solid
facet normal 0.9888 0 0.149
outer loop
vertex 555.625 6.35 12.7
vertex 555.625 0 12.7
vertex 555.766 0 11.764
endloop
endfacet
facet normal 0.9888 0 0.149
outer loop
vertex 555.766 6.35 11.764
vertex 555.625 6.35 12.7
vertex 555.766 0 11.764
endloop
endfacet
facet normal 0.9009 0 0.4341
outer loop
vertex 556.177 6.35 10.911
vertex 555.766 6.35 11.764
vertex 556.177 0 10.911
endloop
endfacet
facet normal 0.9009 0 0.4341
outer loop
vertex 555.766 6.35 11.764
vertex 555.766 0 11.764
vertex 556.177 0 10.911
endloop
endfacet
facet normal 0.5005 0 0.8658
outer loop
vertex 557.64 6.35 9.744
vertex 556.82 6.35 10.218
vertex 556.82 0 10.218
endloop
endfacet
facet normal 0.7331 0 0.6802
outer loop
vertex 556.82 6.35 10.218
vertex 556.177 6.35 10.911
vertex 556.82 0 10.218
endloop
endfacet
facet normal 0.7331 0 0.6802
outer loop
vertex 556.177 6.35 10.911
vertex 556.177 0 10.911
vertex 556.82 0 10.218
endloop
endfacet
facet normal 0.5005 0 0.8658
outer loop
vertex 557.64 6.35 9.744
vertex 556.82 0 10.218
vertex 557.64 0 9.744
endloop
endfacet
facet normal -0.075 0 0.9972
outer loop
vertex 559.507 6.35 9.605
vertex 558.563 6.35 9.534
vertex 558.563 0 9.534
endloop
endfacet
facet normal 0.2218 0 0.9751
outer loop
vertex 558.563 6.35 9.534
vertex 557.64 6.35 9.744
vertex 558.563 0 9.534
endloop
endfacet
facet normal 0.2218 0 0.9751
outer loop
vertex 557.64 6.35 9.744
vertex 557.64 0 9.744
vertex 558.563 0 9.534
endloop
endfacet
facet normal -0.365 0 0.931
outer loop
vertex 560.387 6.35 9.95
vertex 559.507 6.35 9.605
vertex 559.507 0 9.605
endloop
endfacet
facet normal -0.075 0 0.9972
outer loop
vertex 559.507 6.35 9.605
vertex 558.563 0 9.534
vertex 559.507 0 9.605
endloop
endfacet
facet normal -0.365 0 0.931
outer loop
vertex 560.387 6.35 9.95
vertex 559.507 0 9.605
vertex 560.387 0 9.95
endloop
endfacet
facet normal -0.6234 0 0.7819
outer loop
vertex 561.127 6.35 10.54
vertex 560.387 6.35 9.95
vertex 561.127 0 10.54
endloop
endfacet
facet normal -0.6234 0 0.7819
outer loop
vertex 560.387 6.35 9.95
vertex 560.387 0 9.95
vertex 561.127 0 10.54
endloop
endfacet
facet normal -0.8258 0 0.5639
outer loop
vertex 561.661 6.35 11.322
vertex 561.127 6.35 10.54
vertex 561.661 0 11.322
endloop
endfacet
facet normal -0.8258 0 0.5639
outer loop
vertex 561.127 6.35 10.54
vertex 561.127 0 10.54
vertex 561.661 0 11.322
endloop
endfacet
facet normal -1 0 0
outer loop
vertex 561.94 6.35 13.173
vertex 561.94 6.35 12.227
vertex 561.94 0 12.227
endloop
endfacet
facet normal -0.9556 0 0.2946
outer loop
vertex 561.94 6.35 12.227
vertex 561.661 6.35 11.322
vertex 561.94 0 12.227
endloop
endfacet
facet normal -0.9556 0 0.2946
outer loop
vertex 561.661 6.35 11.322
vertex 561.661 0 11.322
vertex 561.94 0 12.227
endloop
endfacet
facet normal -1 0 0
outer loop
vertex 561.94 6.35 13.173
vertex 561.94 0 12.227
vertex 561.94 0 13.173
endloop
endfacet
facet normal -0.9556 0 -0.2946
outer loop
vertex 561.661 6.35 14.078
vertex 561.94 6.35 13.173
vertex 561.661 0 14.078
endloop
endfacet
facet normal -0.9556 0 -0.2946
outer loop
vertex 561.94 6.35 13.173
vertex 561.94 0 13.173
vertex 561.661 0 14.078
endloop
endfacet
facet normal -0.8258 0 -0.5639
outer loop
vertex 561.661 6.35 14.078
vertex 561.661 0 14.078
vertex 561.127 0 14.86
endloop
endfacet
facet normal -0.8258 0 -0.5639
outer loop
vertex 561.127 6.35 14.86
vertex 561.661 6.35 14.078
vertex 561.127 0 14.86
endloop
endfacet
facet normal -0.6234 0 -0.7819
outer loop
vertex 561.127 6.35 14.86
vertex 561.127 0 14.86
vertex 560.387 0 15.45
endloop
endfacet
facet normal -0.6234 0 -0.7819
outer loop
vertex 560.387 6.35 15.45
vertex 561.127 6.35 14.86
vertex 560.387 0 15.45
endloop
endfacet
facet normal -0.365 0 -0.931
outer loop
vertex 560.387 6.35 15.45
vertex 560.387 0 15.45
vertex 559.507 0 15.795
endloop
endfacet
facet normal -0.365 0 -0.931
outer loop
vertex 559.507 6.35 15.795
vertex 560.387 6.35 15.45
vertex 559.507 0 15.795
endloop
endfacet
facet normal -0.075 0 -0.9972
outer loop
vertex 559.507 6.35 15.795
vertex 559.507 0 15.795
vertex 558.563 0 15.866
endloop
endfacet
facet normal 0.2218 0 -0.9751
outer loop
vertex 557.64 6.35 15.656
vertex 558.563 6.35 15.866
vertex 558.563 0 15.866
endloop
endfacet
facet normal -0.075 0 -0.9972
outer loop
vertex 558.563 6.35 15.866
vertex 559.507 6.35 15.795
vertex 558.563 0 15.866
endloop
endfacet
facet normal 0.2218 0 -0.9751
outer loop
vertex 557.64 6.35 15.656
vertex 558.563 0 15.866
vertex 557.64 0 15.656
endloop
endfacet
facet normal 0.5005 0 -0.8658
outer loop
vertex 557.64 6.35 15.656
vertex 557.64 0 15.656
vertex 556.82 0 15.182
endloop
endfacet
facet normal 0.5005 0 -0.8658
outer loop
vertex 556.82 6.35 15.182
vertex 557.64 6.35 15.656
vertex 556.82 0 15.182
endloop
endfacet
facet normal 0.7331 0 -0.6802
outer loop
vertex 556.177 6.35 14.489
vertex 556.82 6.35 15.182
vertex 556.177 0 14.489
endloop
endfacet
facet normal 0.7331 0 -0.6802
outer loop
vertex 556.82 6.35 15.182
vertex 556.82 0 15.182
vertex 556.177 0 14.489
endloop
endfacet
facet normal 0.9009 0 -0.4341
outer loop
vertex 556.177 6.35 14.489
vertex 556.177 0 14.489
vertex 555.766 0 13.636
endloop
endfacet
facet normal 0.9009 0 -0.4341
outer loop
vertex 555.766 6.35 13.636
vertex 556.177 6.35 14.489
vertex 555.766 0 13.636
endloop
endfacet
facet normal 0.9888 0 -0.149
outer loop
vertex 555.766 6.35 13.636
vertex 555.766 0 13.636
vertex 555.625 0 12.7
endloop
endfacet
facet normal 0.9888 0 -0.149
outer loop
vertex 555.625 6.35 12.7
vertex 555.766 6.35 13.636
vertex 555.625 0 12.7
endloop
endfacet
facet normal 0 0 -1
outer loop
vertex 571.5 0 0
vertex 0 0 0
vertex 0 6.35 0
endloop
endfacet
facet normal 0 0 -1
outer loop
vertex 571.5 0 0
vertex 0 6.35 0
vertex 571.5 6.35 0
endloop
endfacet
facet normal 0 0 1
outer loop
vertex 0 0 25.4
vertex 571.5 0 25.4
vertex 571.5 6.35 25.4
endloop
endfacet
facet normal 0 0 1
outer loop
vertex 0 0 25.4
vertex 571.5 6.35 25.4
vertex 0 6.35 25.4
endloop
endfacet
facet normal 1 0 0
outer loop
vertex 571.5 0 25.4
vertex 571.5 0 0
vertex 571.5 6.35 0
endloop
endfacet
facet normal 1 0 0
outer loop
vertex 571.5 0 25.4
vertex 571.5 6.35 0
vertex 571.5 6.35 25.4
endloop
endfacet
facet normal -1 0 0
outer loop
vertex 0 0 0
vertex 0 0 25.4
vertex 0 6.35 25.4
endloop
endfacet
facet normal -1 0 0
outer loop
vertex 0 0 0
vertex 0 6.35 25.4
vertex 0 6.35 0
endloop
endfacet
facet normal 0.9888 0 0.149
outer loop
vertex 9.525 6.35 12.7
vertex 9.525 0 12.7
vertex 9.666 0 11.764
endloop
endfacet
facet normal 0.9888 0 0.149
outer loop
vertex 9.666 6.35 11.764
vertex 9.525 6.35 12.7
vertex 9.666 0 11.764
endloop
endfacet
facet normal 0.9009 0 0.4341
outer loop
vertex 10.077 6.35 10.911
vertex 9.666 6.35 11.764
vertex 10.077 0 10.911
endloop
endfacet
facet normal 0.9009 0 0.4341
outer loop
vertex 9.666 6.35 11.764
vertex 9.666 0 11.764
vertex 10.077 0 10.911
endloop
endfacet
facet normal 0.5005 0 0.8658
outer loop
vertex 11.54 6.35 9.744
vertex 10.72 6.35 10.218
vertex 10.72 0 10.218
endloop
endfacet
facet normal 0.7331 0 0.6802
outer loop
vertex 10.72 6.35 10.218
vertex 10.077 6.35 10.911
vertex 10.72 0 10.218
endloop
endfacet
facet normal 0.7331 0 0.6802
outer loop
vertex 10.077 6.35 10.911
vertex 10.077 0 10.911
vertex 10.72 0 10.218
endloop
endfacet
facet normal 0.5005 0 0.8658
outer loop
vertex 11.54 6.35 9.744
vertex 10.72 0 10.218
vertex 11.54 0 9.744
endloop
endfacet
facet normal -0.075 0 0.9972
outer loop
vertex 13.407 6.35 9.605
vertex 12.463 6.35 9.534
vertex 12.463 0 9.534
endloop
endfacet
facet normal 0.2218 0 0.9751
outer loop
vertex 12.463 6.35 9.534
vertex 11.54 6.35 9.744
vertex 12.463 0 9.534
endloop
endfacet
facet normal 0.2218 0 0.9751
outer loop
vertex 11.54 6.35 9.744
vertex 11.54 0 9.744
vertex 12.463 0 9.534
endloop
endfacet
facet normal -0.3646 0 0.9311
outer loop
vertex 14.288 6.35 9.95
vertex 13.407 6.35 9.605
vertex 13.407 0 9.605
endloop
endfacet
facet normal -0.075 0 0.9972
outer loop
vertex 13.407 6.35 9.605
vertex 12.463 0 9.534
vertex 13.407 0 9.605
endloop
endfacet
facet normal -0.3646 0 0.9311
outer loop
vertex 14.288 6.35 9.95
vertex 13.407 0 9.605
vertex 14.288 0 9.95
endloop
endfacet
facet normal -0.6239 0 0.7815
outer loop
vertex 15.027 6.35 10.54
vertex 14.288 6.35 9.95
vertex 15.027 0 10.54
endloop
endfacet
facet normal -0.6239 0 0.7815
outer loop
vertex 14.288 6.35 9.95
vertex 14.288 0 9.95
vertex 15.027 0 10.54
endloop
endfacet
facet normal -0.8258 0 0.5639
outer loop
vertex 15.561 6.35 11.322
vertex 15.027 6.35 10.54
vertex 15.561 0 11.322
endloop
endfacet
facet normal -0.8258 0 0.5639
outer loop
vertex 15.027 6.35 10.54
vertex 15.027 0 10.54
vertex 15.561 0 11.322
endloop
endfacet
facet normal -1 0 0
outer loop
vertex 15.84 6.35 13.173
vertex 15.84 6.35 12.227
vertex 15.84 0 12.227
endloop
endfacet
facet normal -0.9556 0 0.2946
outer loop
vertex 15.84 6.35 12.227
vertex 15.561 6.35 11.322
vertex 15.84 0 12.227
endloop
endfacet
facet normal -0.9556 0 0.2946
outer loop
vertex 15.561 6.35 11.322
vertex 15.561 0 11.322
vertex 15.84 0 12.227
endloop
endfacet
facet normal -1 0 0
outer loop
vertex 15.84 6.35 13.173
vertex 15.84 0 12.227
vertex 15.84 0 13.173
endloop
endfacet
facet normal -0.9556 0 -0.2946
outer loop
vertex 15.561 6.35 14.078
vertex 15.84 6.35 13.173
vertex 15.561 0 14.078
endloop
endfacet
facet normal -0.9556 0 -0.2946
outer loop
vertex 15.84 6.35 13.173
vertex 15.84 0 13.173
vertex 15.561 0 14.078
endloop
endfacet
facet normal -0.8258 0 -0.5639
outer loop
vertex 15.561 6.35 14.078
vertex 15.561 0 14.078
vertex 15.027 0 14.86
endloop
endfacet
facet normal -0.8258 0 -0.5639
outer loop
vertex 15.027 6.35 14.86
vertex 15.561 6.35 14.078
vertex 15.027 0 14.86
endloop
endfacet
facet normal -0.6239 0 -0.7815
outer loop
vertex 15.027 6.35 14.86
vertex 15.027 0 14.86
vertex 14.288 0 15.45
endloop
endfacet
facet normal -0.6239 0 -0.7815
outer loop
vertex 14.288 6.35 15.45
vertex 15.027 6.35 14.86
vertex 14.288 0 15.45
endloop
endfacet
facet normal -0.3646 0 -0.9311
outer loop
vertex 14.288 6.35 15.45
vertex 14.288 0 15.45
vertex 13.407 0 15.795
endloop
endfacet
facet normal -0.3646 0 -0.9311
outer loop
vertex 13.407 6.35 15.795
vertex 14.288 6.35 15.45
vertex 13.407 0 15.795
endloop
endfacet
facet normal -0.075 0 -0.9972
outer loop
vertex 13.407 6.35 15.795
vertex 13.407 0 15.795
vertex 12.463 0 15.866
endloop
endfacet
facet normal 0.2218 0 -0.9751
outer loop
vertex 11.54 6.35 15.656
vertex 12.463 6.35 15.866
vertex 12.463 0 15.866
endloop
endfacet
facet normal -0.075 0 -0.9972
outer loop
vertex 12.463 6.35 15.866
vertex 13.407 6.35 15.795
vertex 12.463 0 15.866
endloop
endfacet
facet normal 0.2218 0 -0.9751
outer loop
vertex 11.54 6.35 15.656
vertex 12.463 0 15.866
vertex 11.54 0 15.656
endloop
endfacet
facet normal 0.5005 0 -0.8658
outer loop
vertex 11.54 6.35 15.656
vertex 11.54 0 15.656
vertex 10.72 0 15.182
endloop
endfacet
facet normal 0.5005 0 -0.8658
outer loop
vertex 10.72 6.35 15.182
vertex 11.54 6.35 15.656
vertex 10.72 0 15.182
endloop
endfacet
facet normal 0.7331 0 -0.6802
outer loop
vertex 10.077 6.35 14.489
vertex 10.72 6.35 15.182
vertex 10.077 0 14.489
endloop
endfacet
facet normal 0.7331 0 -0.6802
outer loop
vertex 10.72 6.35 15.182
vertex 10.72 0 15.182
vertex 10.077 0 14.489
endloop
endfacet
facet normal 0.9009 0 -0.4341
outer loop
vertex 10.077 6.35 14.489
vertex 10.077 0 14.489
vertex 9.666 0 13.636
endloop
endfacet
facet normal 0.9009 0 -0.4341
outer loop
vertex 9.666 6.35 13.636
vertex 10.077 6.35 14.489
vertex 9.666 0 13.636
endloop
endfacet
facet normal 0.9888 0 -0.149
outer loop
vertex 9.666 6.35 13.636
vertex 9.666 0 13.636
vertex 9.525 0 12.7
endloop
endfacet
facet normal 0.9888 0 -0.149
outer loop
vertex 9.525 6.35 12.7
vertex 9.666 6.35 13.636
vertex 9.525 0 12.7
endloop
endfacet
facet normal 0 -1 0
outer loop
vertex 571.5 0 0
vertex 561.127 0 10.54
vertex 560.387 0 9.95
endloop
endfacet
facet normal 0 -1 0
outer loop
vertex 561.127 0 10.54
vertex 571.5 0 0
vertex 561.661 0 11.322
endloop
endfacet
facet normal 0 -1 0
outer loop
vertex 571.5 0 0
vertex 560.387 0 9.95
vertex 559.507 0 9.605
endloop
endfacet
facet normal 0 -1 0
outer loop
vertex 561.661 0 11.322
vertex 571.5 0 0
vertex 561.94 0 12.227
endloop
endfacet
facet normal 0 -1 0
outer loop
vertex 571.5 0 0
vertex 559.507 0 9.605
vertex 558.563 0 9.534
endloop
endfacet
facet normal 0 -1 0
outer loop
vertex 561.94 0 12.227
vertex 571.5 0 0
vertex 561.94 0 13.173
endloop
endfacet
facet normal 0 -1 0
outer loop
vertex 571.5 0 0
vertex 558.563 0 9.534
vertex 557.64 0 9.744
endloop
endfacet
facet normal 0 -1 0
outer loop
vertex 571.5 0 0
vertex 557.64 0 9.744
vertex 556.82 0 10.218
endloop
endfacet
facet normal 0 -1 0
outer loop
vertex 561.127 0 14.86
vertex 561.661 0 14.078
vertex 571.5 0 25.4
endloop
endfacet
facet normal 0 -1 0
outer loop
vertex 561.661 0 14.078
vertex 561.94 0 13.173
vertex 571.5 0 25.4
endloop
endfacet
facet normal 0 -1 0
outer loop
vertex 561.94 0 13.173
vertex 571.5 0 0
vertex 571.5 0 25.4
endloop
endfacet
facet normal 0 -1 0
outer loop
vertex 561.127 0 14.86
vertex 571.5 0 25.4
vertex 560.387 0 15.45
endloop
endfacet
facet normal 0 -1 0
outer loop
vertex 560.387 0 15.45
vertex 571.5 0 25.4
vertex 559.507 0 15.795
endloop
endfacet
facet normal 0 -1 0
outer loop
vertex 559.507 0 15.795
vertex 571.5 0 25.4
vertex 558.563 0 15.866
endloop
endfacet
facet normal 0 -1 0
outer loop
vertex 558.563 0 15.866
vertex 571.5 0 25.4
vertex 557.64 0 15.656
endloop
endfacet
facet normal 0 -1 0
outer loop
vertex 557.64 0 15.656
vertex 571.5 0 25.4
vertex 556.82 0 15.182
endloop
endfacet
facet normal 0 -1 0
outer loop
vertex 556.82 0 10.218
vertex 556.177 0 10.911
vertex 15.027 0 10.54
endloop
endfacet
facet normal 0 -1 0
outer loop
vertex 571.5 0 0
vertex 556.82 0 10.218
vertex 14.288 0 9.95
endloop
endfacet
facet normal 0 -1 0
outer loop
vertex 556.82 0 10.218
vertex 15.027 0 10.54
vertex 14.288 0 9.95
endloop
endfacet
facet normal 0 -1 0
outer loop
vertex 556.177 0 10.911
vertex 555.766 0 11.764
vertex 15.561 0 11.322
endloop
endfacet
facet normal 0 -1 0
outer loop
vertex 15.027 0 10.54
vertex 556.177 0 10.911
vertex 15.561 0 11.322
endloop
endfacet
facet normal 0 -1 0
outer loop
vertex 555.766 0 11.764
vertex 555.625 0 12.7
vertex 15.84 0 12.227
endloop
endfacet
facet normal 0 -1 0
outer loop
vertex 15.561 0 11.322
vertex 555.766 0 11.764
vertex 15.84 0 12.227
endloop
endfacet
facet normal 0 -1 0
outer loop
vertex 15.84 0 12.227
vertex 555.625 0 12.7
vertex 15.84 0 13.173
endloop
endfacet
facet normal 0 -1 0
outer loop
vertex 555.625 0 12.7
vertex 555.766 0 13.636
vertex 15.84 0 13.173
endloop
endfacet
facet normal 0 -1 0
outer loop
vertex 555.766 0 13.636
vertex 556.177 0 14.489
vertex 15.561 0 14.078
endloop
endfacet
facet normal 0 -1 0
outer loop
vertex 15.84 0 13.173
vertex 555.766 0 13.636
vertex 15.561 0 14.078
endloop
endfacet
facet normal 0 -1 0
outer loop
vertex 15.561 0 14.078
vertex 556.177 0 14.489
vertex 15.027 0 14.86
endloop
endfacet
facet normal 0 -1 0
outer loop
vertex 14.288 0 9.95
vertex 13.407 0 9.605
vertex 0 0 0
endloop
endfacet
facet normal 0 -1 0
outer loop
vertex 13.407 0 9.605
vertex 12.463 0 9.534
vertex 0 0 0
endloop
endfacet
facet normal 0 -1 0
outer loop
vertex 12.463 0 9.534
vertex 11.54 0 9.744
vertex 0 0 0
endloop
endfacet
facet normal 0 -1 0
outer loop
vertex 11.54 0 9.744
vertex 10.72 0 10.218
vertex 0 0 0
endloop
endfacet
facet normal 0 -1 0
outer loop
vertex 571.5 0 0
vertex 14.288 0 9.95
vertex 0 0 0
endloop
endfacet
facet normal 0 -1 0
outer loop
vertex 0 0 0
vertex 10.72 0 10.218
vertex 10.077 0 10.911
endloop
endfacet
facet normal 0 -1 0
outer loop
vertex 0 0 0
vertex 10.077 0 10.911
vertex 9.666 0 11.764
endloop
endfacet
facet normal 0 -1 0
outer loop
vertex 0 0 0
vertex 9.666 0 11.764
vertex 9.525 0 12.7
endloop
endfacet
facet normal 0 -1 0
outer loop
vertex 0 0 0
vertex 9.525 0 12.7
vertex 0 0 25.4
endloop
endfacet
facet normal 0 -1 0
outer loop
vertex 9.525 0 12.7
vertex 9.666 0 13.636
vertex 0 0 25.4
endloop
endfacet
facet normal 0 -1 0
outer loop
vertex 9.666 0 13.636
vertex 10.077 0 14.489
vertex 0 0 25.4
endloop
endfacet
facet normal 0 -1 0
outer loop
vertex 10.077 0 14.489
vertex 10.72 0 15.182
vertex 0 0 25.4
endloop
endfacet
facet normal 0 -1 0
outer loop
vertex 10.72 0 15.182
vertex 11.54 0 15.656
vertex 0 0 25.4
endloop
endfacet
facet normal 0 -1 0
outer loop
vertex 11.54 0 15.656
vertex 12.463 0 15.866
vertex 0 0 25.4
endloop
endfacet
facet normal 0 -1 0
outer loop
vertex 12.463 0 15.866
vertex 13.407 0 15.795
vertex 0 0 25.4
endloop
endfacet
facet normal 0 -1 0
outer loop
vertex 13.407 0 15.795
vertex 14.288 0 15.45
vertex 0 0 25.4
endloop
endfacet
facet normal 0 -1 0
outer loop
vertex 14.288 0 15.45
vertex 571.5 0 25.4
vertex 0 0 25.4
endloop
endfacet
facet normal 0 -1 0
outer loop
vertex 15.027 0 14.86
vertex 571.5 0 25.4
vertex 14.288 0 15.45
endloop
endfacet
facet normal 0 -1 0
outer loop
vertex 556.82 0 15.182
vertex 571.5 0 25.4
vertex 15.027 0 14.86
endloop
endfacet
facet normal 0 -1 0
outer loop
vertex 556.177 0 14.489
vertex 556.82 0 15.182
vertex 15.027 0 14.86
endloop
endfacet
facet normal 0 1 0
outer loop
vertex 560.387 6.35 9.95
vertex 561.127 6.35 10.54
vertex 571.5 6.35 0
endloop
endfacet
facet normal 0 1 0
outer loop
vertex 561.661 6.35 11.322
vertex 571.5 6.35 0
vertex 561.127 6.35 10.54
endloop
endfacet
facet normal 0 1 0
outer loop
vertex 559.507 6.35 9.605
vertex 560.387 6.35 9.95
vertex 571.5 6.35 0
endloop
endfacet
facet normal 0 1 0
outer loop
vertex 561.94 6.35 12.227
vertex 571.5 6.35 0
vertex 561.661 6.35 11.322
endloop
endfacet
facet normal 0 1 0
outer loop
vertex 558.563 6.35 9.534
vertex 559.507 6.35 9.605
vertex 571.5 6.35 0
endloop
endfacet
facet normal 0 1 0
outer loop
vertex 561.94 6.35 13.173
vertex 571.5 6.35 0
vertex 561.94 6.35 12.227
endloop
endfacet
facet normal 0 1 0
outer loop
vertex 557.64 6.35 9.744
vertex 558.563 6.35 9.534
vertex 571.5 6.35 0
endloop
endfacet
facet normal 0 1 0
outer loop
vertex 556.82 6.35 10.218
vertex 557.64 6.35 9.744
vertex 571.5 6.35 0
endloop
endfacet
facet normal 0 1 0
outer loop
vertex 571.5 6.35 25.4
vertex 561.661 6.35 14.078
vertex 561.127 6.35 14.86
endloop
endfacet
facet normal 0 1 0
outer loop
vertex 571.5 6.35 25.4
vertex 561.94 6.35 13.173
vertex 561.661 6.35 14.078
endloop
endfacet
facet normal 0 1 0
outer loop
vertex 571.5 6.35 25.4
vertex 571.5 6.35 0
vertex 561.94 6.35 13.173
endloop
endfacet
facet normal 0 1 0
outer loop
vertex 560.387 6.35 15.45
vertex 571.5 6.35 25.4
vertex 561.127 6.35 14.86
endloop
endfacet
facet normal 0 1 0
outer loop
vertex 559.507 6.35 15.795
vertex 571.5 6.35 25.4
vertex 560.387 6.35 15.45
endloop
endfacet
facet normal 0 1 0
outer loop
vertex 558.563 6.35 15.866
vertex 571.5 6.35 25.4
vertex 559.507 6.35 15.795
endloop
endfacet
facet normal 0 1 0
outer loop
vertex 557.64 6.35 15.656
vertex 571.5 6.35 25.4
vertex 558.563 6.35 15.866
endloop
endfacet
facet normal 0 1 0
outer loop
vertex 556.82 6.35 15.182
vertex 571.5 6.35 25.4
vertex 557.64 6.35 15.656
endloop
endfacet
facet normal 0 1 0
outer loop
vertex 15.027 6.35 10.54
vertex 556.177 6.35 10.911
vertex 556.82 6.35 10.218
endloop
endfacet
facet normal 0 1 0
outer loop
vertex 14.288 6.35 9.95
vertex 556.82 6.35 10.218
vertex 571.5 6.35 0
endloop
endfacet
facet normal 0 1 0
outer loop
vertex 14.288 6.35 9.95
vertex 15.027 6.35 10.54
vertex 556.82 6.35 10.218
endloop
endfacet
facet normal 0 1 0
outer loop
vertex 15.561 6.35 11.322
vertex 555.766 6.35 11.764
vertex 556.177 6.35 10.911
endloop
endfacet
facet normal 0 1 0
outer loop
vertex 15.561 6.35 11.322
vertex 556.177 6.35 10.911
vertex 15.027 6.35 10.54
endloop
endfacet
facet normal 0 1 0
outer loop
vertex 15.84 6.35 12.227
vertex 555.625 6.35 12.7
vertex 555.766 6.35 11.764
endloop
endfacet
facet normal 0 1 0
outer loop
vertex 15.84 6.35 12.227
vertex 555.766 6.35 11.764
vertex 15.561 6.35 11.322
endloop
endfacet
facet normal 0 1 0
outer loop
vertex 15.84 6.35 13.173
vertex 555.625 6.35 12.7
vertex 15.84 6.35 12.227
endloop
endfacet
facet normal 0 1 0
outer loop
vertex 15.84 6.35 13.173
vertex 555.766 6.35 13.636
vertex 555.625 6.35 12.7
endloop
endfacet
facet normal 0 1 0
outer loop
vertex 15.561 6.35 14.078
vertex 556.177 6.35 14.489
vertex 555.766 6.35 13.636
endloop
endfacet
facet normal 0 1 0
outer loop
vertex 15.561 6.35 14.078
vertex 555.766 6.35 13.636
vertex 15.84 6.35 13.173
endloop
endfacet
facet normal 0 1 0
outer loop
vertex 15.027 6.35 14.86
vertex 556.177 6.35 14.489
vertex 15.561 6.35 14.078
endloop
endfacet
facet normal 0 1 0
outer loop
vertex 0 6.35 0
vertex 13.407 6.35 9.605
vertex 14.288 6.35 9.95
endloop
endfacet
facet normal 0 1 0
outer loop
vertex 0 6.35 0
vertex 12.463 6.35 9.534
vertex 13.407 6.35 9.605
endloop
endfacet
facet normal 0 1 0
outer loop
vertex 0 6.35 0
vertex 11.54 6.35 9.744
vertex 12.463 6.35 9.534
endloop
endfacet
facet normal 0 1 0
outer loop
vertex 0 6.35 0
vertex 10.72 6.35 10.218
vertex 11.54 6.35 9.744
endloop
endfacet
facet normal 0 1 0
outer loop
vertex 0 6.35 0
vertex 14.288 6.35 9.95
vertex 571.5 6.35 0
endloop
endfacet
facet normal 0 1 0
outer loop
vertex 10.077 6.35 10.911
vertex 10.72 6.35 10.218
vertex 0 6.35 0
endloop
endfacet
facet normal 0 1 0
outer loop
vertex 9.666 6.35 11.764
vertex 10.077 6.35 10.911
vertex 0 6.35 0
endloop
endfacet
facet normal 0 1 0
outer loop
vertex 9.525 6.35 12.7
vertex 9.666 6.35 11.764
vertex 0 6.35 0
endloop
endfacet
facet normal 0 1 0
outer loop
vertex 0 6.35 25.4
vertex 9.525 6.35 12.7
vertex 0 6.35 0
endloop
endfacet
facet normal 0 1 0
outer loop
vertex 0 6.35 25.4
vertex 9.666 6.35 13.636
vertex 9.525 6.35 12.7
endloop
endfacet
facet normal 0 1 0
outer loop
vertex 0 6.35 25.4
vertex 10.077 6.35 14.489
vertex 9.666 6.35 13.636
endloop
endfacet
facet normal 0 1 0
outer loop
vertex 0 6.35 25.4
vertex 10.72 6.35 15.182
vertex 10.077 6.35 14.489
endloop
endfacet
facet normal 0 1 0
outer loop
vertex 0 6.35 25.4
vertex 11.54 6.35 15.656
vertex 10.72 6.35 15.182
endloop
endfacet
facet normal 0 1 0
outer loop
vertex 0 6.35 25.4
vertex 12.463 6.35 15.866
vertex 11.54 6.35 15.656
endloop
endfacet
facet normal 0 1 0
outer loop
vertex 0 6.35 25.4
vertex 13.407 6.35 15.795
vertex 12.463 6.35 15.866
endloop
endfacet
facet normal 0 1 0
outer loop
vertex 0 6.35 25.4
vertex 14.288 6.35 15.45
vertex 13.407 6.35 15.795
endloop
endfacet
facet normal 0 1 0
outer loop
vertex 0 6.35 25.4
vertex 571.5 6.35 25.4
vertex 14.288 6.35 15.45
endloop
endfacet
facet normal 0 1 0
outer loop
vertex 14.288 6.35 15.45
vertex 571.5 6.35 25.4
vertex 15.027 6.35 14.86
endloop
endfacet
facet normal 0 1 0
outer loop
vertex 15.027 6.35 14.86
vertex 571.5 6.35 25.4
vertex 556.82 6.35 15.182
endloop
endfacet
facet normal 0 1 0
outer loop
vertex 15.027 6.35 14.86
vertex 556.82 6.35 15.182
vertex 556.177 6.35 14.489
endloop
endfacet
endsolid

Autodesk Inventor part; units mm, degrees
ref_plane "YZ Plane" through (0, 0, 0) normal (1, 0, 0) x (0, 1, 0)
ref_plane "XZ Plane" through (0, 0, 0) normal (0, 1, 0) x (-1, 0, 0)
ref_plane "XY Plane" through (0, 0, 0) normal (0, 0, 1) x (1, 0, 0)
sketch "Sketch1" plane through (0, 0, 0) normal (0, 1, 0) x (-1, 0, 0)
  line L0 (0, 0) -> (-571.5, 0)
  line L1 (-571.5, 0) -> (-571.5, 25.4)
  line L2 (-571.5, 25.4) -> (0, 25.4)
  line L3 (0, 25.4) -> (0, 0)
  circle A0 centre (-12.7, 12.7) radius 3.175
  circle A1 centre (-558.8, 12.7) radius 3.175
  dimension "d0" = 571.5
  dimension "d1" = 25.4
  dimension "d2" = 6.35
  dimension "d3" = 12.7
  dimension "d4" = 12.7
  dimension "d5" = 6.35
  dimension "d6" = 12.7
  dimension "d7" = 12.7
extrude "Extrusion1" add sketch "Sketch1" along normal blind 6.35
equation "\"BendRadius\" = Thickness"
equation "\"BendReliefWidth\" = Thickness"
equation "\"BendReliefDepth\" = 0.5 * Thickness"
equation "\"CornerReliefSize\" = 4 * Thickness"
equation "\"MinimumRemnant\" = 2 * Thickness"
equation "\"TransitionRadius\" = BendRadius"
equation "\"JacobiRadiusSize\" = Thickness"
equation "\"GapSize\" = Thickness"
equation "\"Thickness\" = 3.048"
properties part number "15102898-16-P-0214" material "Aluminum 6061"
